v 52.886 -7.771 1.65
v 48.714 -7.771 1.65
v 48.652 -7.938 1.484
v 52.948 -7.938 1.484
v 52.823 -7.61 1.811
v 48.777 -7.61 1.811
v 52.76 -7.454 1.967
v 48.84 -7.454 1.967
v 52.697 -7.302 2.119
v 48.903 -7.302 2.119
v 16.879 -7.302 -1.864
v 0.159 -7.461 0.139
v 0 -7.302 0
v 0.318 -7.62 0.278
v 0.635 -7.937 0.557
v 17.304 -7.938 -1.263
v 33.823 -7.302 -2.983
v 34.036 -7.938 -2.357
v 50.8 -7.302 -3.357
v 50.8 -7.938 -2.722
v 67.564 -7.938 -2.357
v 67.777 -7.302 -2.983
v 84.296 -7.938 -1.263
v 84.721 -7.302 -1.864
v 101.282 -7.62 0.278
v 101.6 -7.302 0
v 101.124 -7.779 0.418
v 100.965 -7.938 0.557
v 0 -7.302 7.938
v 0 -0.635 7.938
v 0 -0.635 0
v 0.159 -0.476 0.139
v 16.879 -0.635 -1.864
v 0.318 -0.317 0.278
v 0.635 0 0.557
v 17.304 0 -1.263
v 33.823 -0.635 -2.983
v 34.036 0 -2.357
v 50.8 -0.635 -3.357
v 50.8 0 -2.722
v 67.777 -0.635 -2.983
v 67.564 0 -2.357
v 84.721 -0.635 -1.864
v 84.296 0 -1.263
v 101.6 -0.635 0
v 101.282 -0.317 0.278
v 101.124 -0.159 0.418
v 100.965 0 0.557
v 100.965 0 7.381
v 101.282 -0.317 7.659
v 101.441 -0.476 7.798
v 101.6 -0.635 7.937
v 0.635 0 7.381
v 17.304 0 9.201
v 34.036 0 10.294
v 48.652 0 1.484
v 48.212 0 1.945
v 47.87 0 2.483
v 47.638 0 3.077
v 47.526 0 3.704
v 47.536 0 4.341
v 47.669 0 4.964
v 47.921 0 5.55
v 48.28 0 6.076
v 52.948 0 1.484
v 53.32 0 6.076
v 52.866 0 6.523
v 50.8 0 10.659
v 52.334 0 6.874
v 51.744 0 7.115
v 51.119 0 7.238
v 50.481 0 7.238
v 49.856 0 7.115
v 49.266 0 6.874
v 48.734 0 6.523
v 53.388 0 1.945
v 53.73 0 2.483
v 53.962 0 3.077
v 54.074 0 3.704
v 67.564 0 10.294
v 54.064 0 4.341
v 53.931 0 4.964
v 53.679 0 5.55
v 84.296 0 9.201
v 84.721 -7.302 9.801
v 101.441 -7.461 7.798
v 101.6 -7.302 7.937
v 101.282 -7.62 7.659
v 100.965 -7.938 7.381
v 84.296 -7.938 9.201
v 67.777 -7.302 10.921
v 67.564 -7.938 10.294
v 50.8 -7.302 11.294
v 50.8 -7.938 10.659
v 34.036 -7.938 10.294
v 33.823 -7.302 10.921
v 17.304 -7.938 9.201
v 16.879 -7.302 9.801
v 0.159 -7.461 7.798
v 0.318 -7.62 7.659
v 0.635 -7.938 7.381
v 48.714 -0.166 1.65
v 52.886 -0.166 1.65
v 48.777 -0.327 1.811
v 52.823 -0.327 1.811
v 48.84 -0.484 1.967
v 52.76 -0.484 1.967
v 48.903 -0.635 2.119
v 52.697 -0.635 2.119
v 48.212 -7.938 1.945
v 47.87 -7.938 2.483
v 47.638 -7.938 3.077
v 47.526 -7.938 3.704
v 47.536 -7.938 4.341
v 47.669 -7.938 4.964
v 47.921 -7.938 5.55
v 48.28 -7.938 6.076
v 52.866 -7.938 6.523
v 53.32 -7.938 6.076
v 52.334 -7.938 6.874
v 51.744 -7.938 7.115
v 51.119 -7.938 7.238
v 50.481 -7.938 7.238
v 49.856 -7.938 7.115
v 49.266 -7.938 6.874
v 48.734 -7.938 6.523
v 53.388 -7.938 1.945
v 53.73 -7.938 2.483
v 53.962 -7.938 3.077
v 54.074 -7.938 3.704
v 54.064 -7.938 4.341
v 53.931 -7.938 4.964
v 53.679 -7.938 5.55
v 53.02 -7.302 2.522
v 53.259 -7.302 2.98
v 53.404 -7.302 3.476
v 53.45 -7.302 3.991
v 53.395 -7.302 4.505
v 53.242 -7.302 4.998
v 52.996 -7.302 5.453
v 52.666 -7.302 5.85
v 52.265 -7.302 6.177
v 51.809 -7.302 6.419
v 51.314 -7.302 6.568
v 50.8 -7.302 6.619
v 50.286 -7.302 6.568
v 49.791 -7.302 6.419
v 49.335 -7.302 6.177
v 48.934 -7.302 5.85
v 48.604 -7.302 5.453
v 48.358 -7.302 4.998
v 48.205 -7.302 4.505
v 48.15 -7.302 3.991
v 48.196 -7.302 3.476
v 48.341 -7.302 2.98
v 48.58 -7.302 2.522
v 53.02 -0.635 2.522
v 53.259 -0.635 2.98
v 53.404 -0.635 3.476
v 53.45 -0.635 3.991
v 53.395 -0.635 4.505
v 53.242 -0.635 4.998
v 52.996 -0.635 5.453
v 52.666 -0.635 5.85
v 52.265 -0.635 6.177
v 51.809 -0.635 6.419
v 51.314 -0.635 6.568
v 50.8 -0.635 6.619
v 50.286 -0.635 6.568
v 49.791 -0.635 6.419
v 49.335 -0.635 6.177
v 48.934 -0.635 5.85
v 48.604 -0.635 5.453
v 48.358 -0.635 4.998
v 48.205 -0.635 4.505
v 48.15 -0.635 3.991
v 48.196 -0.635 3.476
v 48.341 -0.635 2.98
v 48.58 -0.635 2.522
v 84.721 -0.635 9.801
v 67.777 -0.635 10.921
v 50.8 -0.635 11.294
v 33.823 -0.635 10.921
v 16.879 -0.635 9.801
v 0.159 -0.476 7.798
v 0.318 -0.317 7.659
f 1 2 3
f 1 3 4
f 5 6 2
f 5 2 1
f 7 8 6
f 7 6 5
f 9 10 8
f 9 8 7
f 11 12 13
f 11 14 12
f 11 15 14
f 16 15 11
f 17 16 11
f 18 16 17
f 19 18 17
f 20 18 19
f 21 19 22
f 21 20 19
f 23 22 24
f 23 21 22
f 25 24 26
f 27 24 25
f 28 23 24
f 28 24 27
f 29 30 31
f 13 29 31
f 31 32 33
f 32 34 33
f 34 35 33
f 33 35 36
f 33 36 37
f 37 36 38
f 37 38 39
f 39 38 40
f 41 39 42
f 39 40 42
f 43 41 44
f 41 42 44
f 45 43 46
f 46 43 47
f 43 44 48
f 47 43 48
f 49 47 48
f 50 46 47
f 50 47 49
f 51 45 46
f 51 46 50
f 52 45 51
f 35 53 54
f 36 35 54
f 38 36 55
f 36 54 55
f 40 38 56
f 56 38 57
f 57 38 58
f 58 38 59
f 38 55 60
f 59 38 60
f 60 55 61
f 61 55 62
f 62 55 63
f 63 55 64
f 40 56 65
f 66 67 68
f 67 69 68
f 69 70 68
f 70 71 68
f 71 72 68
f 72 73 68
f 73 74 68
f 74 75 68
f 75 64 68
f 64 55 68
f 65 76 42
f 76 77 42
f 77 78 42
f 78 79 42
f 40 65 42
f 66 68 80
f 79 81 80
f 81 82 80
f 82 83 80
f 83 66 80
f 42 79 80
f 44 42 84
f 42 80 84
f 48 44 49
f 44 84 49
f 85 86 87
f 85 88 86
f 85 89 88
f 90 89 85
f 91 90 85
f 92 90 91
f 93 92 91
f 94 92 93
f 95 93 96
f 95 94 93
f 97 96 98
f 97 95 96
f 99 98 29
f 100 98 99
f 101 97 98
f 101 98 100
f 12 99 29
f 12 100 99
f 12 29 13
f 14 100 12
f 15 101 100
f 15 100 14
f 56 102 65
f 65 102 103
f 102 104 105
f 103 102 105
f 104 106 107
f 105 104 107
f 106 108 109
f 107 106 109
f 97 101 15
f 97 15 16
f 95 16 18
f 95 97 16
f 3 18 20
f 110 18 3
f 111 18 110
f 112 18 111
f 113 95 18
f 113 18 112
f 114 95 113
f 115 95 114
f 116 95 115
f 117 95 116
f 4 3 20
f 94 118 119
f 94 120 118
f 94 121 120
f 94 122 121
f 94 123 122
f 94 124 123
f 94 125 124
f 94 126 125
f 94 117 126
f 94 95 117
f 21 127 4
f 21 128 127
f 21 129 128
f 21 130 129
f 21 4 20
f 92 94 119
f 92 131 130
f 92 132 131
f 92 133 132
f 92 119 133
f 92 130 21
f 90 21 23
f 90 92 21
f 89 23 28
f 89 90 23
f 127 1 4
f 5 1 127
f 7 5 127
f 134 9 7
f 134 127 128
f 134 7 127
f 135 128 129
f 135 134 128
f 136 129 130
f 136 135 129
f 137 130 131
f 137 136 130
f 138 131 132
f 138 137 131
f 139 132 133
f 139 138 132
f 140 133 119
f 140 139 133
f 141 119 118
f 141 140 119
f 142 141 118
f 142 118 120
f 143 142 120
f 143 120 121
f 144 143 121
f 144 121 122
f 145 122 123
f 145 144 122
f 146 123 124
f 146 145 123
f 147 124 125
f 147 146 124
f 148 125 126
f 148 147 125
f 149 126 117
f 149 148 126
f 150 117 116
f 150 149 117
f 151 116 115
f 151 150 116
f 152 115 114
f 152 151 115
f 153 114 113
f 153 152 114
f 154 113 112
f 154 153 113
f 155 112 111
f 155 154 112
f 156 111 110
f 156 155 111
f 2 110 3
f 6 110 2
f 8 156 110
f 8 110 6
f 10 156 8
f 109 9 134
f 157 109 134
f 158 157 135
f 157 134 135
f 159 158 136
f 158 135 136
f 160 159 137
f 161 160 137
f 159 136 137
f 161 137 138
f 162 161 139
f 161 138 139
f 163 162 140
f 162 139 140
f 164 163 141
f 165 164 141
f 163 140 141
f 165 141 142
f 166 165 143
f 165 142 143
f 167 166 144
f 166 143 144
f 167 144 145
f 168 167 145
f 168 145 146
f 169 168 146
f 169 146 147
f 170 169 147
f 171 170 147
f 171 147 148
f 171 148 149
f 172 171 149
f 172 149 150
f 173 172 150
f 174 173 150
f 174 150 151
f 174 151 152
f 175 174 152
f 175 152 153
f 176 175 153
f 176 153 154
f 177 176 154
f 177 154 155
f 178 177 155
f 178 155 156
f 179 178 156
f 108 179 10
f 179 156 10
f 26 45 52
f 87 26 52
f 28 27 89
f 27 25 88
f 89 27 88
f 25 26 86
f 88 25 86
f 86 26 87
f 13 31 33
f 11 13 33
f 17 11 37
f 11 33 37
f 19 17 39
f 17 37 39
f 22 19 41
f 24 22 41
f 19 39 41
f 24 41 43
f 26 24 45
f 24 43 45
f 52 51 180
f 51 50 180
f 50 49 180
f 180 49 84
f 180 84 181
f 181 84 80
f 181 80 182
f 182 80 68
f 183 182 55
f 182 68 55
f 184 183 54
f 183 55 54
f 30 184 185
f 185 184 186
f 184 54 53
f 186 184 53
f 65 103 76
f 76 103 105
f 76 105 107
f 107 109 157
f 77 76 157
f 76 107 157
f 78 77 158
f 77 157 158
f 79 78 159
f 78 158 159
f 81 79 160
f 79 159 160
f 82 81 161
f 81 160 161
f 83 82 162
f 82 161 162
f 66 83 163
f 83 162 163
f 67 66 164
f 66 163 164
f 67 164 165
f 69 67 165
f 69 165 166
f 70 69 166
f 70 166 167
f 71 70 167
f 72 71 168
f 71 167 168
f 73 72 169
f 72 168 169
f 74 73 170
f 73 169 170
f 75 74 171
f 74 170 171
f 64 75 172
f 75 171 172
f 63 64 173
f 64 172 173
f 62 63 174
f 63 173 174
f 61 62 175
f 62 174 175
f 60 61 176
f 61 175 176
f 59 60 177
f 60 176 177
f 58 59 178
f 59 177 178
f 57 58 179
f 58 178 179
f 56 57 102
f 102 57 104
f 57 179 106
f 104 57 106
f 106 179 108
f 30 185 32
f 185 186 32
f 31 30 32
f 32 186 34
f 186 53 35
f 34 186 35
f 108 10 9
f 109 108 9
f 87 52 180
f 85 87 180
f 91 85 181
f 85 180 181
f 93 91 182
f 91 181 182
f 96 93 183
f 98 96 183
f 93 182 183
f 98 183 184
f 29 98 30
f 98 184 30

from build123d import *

# Parameters (mm, degrees)
F1_DEPTH = 7.9375
F3_DEPTH = 7.9385
F4_SIZE  = 0.635


with BuildPart() as f1:
    # F0 (on Front) → F1 (new body)
    with BuildSketch(Plane.XZ):
        with BuildLine():
            Line((0, 7.9375), (0, 0))
            ThreePointArc((0, 0), (50.8, -3.3566973387), (101.6, 0))
            Line((101.6, 0), (101.6, 7.9375))
            ThreePointArc((101.6, 7.9375), (50.8, 11.2941973387), (0, 7.9375))
        make_face()
    extrude(amount=F1_DEPTH)

    # F2 (on face) → F3 (cut, through all)
    with BuildSketch(Plane.XZ.offset(7.9375)):
        with BuildLine():
            Line((48.9026334039, 2.11875), (52.6973665961, 2.11875))
            ThreePointArc((52.6973665961, 2.11875), (50.8, 6.61875), (48.9026334039, 2.11875))
        make_face()
    extrude(amount=-F3_DEPTH, mode=Mode.SUBTRACT)

    # F4
    f4_edges = [f1.edges().sort_by_distance(p)[0] for p in [
        (50.8, -7.9375, 11.294197),
        (101.6, -7.9375, 3.96875),
        (0, -7.9375, 3.96875),
        (50.8, -7.9375, -3.356697),
        (50.8, -7.9375, 2.11875),
        (50.8, -7.9375, 6.61875),
        (50.8, 0, 11.294197),
        (101.6, 0, 3.96875),
        (0, 0, 3.96875),
        (50.8, 0, -3.356697),
        (50.8, 0, 2.11875),
        (50.8, 0, 6.61875),
    ]]
    chamfer(f4_edges, length=F4_SIZE)


solid = f1.part
